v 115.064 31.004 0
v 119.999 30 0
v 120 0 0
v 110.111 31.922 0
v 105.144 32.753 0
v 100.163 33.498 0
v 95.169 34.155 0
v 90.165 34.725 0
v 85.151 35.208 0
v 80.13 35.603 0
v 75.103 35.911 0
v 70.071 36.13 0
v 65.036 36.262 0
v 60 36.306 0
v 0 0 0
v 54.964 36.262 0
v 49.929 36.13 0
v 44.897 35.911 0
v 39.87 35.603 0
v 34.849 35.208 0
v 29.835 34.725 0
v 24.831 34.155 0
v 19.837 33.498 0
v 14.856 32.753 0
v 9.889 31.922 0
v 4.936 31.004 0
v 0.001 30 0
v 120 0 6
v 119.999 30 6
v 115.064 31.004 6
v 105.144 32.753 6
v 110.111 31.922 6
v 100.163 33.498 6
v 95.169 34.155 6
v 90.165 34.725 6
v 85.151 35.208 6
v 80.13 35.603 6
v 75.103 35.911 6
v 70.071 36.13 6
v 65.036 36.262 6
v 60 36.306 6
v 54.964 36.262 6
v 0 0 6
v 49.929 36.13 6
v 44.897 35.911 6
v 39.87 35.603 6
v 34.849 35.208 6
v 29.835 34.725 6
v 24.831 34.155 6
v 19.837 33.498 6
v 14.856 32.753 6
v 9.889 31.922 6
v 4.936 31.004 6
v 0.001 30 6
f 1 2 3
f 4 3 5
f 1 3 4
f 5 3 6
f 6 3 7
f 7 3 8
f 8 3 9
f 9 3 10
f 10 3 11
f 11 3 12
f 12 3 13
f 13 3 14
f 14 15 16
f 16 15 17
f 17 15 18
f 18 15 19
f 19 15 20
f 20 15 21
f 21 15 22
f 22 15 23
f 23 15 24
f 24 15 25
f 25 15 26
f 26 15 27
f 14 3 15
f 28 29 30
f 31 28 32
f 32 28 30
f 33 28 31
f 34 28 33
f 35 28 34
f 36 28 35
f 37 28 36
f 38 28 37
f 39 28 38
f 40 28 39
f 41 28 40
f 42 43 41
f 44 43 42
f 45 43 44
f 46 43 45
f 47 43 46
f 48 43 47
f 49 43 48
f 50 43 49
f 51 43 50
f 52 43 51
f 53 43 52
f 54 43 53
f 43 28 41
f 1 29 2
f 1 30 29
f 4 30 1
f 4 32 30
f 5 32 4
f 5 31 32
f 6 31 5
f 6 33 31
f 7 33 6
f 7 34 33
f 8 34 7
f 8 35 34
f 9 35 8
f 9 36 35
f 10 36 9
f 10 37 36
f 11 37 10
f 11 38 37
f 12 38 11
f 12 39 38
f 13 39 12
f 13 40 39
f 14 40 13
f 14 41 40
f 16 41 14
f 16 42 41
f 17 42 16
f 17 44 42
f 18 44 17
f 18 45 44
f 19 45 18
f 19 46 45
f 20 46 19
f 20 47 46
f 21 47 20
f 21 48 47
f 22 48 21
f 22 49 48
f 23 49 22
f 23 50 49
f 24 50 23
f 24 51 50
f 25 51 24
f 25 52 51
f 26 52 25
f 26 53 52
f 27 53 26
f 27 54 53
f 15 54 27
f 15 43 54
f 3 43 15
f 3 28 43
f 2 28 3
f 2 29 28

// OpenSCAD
$fn = 32;

// ----------------------------------------------------------------------
// Arc profile plate: crown, 27 points
// ----------------------------------------------------------------------

// --- parameters (mm) ---
bar_l = 120;              // bar length, X
bar_w = 30;               // bar height at the ends, Y
arc_r = 288.58;           // radius of the crown arc
arc_angle = 24;           // crown arc angle, degrees
crown_rise = 6.31;        // rise of the crown over the ends
arc_step = 1;             // sampling step of the crown arc, degrees
plate_t = 6;              // plate thickness, Z

bbox_y = bar_w + crown_rise;  // full height with the crown

profile = [[119.999, 30], [115.064, 31.004], [110.111, 31.922], [105.144, 32.753], [100.163, 33.498], [95.169, 34.155], [90.165, 34.725], [85.151, 35.208], [80.13, 35.603], [75.103, 35.911], [70.071, 36.13], [65.036, 36.262], [60, 36.306], [54.964, 36.262], [49.929, 36.13], [44.897, 35.911], [39.87, 35.603], [34.849, 35.208], [29.835, 34.725], [24.831, 34.155], [19.837, 33.498], [14.856, 32.753], [9.889, 31.922], [4.936, 31.004], [0.001, 30], [0, 0], [120, 0]];  // primary outline, 27 points, counter clockwise

// --- the one profile operation ---
linear_extrude(height = plate_t) polygon(points = profile);
